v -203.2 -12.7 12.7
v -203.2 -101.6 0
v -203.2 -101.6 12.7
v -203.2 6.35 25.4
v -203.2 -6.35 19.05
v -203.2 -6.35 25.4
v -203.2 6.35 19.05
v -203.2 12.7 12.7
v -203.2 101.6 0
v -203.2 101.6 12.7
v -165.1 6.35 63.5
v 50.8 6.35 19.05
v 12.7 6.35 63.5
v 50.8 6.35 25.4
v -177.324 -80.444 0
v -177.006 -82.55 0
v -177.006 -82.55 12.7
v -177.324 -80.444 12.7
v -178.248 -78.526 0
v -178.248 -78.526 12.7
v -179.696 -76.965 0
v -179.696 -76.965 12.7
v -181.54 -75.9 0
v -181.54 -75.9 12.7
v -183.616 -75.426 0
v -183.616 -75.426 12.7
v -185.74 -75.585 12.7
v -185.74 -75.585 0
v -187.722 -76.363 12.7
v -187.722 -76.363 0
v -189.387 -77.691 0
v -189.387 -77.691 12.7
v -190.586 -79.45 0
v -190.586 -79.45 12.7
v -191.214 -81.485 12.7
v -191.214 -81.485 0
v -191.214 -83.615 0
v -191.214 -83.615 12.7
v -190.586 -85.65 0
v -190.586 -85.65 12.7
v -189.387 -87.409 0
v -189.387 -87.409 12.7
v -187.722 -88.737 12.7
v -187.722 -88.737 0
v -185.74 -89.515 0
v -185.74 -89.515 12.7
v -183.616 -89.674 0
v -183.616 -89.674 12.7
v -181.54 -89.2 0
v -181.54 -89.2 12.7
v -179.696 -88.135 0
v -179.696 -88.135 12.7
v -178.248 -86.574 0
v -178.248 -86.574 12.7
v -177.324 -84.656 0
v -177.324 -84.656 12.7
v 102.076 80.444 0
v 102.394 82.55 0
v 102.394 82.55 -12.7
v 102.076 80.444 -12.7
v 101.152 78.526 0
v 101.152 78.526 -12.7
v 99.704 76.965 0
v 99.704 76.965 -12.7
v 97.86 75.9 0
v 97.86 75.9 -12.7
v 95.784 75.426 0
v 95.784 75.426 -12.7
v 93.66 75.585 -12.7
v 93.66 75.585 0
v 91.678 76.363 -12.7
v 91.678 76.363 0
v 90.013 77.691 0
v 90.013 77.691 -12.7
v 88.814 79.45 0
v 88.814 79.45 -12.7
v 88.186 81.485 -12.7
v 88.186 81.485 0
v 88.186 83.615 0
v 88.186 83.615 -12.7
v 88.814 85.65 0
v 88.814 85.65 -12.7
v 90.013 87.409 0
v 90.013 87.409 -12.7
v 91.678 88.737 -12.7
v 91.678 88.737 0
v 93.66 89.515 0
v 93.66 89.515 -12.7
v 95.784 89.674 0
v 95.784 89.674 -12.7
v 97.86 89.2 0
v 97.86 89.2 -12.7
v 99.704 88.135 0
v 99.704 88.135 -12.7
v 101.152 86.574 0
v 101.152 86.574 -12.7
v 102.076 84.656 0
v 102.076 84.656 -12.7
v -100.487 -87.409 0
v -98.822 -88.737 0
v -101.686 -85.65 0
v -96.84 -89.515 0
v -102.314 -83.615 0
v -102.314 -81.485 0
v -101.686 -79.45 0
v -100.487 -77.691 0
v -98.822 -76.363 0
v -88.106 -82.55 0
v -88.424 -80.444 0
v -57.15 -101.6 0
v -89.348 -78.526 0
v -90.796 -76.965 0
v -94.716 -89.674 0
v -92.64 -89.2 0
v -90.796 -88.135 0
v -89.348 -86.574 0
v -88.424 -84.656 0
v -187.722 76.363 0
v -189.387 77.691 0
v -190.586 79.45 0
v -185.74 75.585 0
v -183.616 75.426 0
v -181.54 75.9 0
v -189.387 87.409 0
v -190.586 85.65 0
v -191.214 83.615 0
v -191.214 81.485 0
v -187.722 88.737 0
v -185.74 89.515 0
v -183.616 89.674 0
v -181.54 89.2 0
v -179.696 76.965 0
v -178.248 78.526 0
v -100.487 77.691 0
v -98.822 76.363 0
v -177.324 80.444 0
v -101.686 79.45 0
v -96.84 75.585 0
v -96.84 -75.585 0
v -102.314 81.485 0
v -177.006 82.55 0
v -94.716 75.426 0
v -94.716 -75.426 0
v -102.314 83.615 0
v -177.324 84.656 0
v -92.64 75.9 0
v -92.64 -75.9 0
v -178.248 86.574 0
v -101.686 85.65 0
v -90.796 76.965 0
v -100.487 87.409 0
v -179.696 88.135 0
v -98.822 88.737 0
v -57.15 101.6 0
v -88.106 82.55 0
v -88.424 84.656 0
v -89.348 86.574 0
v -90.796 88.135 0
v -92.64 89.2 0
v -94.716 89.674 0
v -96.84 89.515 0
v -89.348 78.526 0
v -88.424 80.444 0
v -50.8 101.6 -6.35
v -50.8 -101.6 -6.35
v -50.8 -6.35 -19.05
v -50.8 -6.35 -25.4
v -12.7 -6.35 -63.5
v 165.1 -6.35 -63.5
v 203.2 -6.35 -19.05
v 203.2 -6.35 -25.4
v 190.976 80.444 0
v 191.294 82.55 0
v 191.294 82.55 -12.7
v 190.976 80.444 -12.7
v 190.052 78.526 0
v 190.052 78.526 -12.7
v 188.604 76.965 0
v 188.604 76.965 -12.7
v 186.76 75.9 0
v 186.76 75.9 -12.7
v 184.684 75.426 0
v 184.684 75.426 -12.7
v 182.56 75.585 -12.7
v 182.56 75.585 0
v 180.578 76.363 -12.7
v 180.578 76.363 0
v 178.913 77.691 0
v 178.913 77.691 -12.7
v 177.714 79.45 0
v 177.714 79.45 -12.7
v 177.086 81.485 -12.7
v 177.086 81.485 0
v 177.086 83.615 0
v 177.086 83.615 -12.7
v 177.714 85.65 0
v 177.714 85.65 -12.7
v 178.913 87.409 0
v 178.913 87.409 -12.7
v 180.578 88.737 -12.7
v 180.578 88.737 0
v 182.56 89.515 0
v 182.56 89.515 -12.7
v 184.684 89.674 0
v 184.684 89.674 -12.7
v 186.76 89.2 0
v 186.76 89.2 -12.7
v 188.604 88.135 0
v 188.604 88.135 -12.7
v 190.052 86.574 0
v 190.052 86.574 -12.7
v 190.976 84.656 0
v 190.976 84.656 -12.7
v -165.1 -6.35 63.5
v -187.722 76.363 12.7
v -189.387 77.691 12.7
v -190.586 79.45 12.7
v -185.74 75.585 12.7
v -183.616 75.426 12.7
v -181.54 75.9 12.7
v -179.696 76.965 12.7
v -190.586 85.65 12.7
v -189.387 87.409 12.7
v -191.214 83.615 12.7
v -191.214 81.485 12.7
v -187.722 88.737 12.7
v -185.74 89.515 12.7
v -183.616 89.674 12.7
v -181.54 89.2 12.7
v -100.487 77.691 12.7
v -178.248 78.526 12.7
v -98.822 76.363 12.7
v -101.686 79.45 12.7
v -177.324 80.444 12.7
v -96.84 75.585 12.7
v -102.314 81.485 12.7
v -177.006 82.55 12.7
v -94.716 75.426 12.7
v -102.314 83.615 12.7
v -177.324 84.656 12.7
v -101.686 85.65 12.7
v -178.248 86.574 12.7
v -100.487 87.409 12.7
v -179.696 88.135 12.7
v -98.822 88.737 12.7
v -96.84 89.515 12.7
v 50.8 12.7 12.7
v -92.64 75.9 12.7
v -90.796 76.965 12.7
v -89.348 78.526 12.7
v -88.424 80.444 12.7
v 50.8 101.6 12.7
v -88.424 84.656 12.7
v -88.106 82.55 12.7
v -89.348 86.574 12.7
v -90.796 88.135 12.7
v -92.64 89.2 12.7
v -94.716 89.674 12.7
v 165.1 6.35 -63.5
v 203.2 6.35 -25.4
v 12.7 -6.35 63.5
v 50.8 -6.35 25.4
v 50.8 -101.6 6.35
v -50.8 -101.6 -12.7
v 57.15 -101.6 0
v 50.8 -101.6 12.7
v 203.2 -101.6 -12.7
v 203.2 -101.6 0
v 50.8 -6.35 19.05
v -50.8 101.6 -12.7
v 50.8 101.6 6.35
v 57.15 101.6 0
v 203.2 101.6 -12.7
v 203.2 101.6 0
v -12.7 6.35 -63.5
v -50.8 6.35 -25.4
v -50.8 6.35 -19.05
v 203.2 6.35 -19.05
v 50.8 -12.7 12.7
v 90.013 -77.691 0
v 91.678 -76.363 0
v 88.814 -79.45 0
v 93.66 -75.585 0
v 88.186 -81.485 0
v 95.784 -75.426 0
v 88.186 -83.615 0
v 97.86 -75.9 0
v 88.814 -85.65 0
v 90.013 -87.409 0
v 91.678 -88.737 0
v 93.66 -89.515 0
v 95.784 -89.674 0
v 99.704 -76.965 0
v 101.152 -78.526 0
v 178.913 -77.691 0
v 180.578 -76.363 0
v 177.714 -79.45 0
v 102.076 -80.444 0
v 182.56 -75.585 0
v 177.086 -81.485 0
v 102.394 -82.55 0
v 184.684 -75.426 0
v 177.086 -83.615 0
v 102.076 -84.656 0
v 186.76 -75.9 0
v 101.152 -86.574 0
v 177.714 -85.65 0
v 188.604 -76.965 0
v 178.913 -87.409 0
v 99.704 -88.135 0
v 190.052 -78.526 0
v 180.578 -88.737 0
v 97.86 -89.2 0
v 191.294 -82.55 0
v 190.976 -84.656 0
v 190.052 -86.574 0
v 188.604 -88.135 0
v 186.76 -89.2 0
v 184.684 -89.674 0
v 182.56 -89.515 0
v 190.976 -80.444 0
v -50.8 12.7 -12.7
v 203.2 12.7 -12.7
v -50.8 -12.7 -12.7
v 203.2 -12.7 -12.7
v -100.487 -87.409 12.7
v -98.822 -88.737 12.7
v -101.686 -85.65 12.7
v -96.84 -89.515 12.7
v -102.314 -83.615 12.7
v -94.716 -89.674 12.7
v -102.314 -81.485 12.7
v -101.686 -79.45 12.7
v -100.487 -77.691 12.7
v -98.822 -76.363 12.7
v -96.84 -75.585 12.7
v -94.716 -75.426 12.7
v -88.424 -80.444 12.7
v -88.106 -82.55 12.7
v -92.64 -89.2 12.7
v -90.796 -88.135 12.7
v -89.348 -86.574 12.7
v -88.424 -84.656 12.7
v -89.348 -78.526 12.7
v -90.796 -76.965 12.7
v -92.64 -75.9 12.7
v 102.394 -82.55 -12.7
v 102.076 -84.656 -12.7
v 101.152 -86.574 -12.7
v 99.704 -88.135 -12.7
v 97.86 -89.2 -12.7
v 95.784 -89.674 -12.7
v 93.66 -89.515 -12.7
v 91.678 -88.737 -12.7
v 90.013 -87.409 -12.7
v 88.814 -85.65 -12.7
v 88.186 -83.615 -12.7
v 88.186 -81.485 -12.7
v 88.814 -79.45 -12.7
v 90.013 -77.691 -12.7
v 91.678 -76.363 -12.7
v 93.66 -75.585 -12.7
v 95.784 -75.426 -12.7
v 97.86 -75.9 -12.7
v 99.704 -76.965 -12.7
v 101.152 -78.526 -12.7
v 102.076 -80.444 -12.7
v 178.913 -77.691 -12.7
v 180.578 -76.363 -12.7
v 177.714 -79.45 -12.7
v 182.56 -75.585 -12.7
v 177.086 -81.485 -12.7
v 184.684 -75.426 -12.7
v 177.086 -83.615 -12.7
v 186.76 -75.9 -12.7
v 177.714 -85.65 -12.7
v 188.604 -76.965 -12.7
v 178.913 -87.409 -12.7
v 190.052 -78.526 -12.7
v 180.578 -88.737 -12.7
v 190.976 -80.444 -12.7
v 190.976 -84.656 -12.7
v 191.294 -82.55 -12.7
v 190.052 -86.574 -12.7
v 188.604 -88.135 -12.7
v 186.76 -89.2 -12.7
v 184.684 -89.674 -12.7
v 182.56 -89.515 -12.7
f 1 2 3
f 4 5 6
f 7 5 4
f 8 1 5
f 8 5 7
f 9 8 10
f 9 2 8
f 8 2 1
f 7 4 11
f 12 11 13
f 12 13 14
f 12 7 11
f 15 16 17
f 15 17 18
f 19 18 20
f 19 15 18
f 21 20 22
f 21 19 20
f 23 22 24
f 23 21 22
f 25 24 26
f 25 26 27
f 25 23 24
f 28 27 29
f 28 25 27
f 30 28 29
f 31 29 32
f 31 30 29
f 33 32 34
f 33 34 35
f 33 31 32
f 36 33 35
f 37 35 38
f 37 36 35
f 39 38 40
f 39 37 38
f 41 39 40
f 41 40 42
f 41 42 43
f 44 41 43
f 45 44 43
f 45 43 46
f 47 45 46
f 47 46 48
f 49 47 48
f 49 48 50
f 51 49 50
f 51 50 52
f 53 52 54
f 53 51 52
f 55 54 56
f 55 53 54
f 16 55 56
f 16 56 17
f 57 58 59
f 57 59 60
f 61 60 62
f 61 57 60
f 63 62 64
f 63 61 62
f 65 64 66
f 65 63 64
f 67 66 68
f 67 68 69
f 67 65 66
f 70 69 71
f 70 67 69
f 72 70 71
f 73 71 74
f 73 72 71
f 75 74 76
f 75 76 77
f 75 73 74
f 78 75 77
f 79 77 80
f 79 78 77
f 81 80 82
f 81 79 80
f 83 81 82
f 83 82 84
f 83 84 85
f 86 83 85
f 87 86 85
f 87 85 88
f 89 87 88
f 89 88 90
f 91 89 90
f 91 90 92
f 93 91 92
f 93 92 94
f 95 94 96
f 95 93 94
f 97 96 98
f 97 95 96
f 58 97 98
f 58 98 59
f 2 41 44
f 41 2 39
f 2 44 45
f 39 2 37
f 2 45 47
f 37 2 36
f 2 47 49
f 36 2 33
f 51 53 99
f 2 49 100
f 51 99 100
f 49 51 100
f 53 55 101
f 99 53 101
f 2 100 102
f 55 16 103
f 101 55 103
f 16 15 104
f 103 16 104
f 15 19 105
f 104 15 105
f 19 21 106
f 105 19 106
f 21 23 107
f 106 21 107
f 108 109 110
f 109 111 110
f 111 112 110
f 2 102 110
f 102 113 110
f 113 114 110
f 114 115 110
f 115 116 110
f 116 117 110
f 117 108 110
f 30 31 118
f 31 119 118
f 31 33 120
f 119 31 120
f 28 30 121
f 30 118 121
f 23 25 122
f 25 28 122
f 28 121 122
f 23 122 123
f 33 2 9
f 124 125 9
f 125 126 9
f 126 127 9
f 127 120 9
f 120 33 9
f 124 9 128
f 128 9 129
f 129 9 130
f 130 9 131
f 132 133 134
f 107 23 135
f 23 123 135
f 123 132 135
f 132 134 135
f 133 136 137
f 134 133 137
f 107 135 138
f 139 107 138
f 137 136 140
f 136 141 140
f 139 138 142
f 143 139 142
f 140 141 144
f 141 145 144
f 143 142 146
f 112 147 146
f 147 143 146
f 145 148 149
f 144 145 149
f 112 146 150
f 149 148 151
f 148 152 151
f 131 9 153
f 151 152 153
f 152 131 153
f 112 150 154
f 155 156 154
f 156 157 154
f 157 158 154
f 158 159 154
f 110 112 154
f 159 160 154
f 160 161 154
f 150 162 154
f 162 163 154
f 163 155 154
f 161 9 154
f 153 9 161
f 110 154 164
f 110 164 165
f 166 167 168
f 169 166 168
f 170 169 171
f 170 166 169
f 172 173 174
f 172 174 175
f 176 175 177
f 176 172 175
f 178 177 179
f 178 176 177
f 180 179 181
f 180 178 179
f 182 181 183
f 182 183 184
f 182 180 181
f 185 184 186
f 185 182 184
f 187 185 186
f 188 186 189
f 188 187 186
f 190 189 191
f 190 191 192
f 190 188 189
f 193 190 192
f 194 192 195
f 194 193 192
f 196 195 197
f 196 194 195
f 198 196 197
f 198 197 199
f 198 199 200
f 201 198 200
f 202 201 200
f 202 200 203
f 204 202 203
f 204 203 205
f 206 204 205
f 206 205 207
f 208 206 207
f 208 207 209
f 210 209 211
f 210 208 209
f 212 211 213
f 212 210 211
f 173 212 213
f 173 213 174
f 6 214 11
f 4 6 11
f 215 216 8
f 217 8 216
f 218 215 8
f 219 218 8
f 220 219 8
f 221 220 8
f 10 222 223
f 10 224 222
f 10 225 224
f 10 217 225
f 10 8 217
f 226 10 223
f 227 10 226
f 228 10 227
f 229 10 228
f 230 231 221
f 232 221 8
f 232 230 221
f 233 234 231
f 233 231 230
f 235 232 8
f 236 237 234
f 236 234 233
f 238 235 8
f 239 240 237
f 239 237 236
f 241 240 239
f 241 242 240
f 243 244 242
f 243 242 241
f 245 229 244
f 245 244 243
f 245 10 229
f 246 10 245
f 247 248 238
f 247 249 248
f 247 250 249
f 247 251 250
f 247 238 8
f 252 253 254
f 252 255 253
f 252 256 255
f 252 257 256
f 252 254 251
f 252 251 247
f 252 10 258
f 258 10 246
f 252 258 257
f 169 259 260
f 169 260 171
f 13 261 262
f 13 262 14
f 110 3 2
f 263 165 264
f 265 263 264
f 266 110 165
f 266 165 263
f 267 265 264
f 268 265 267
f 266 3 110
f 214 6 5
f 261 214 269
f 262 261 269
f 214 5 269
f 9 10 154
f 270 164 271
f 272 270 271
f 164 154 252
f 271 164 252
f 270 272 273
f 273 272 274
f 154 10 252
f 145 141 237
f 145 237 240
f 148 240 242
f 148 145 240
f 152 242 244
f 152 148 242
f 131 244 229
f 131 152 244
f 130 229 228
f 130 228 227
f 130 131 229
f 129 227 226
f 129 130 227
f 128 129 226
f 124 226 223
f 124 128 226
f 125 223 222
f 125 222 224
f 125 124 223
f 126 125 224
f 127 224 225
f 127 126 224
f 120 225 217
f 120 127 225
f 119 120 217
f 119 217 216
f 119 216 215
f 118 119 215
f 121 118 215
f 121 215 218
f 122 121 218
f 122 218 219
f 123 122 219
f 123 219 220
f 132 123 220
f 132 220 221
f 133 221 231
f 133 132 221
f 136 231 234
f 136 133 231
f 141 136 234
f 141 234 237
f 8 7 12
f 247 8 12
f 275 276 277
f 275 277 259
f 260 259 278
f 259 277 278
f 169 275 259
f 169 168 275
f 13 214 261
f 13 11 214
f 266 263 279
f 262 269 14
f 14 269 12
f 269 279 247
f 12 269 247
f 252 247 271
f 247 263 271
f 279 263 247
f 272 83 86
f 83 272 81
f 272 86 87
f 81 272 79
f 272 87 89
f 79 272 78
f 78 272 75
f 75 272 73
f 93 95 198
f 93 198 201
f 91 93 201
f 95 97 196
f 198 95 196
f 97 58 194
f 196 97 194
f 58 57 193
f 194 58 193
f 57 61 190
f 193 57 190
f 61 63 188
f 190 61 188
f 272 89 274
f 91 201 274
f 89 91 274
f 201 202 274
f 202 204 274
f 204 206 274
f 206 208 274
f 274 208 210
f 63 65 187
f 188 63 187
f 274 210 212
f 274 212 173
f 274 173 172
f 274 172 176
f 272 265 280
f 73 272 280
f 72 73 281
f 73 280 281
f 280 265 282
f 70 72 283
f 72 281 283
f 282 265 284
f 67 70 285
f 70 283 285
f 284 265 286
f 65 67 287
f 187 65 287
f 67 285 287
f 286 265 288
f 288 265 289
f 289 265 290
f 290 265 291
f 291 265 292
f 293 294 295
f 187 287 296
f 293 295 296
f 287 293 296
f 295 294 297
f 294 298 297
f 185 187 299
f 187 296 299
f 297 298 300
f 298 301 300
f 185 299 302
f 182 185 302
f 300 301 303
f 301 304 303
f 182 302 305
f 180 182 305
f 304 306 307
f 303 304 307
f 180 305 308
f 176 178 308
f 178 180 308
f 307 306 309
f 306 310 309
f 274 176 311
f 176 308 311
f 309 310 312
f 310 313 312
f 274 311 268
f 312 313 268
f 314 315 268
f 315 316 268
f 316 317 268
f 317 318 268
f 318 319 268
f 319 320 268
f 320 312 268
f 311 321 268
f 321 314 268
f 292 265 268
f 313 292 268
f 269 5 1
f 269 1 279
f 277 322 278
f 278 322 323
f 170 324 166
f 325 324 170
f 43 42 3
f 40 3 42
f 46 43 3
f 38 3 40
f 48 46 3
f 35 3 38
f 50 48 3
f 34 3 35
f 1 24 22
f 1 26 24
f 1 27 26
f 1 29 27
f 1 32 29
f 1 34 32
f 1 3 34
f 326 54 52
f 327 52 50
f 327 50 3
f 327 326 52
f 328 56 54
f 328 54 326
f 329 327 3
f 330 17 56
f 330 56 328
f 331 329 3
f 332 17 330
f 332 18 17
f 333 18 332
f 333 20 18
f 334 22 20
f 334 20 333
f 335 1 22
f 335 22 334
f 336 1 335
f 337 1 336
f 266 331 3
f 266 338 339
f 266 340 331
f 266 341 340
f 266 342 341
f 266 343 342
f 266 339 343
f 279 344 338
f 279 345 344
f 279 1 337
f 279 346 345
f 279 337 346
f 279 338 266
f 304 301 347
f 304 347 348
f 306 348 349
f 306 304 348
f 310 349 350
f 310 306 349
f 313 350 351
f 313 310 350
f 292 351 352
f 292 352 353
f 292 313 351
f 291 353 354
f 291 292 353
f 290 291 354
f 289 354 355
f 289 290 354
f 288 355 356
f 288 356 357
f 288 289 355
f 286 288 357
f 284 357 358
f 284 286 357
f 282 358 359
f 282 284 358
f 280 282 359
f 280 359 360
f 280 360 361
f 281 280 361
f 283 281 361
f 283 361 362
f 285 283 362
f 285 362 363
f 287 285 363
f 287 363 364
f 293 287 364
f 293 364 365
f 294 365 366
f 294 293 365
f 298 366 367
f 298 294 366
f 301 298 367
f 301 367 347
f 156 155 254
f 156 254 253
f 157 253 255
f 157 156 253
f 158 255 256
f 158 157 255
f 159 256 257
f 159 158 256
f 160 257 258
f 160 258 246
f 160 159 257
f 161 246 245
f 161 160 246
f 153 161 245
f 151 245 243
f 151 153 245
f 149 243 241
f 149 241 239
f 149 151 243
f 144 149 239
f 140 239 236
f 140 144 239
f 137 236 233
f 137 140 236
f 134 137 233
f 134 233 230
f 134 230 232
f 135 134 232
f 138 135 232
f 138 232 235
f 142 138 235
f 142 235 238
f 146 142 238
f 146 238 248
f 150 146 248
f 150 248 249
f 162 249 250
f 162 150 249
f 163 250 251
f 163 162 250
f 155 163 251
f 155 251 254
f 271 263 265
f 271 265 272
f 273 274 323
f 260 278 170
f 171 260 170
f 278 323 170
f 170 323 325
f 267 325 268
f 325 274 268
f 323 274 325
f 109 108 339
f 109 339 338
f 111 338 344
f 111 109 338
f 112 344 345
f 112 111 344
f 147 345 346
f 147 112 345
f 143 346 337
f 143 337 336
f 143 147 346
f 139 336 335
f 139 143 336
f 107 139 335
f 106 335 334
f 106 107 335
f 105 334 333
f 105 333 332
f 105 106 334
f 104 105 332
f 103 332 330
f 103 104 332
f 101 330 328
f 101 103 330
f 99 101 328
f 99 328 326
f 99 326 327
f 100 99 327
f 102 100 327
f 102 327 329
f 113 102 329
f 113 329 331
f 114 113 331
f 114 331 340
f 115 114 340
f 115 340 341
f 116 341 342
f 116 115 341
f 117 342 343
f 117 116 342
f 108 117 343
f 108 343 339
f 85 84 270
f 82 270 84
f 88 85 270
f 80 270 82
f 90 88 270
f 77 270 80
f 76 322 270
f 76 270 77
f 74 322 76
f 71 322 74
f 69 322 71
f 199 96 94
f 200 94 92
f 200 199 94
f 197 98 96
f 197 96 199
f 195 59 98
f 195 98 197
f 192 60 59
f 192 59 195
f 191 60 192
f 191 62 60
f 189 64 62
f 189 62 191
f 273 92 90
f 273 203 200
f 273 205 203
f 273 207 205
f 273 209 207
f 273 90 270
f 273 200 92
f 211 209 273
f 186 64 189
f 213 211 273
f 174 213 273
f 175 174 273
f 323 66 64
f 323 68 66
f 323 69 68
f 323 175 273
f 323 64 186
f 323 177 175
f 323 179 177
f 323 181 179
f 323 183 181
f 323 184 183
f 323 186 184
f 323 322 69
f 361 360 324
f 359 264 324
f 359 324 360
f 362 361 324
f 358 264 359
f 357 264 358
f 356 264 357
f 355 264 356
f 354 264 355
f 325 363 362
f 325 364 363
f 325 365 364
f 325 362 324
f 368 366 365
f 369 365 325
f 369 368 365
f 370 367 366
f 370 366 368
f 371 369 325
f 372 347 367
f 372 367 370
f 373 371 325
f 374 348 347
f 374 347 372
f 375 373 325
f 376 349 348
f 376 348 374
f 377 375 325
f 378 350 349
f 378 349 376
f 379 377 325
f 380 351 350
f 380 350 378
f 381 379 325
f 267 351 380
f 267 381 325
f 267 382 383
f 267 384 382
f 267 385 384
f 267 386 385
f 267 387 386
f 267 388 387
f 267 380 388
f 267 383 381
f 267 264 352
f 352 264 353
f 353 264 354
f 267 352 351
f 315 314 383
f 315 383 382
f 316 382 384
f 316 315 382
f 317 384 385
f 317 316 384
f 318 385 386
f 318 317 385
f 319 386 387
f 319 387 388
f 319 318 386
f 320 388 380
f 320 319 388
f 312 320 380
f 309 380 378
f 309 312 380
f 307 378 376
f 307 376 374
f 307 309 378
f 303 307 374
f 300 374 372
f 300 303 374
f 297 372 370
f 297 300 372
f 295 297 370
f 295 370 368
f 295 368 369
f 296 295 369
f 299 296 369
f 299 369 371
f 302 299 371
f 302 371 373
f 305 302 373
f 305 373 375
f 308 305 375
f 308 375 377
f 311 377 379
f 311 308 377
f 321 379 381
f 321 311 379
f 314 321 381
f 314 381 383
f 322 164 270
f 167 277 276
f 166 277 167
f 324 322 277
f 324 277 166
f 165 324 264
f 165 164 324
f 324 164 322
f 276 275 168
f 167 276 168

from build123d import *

# Parameters (mm, degrees)
F0_W     = 254
F0_H     = 203.2
F0_R     = 7.14375
F1_DEPTH = 12.7
F2_W     = 254
F2_H     = 203.2
F2_R     = 7.14375
F3_DEPTH = 12.7
F4_W     = 254
F4_H     = 12.7
F5_DEPTH = 50.8
F6_SIZE  = 38.1
F7_W     = 254
F7_H     = 12.7
F8_DEPTH = 50.8
F9_SIZE  = 38.1
F10_SIZE = 6.35


with BuildPart() as f1:
    # F0 (on Top) → F1 (new body)
    with BuildSketch(Plane.XY):
        with Locations((-76.2, 0)):
            Rectangle(F0_W, F0_H)
        with Locations((-184.15, -82.55)):
            Circle(F0_R, mode=Mode.SUBTRACT)
        with Locations((-95.25, -82.55)):
            Circle(F0_R, mode=Mode.SUBTRACT)
        with Locations((-184.15, 82.55)):
            Circle(F0_R, mode=Mode.SUBTRACT)
        with Locations((-95.25, 82.55)):
            Circle(F0_R, mode=Mode.SUBTRACT)
    extrude(amount=F1_DEPTH)

    # F2 (on face) → F3 (join)
    with BuildSketch(Plane(origin=(0, 0, 0), x_dir=(1, 0, 0), z_dir=(0, 0, -1))):
        with Locations((76.2, 0)):
            Rectangle(F2_W, F2_H)
        with Locations((95.25, -82.55)):
            Circle(F2_R, mode=Mode.SUBTRACT)
        with Locations((184.15, -82.55)):
            Circle(F2_R, mode=Mode.SUBTRACT)
        with Locations((95.25, 82.55)):
            Circle(F2_R, mode=Mode.SUBTRACT)
        with Locations((184.15, 82.55)):
            Circle(F2_R, mode=Mode.SUBTRACT)
    extrude(amount=F3_DEPTH)

    # F4 (on face) → F5 (join)
    with BuildSketch(Plane.XY.offset(12.7)):
        with Locations((-76.2, 0)):
            Rectangle(F4_W, F4_H)
    extrude(amount=F5_DEPTH)

    # F6
    f6_edges = [f1.edges().sort_by_distance(p)[0] for p in [
        (-203.2, 0, 63.5),
        (50.8, 0, 63.5),
    ]]
    chamfer(f6_edges, length=F6_SIZE)

    # F7 (on face) → F8 (join)
    with BuildSketch(Plane(origin=(0, 0, -12.7), x_dir=(1, 0, 0), z_dir=(0, 0, -1))):
        with Locations((76.2, 0)):
            Rectangle(F7_W, F7_H)
    extrude(amount=F8_DEPTH)

    # F9
    f9_edges = [f1.edges().sort_by_distance(p)[0] for p in [
        (203.2, 0, -63.5),
        (-50.8, 0, -63.5),
    ]]
    chamfer(f9_edges, length=F9_SIZE)

    # F10
    f10_edges = [f1.edges().sort_by_distance(p)[0] for p in [
        (50.8, 0, 0),
        (-76.2, -6.35, 12.7),
        (-76.2, 6.35, 12.7),
        (-50.8, 0, 0),
        (76.2, 6.35, -12.7),
        (76.2, -6.35, -12.7),
    ]]
    chamfer(f10_edges, length=F10_SIZE)


solid = f1.part
